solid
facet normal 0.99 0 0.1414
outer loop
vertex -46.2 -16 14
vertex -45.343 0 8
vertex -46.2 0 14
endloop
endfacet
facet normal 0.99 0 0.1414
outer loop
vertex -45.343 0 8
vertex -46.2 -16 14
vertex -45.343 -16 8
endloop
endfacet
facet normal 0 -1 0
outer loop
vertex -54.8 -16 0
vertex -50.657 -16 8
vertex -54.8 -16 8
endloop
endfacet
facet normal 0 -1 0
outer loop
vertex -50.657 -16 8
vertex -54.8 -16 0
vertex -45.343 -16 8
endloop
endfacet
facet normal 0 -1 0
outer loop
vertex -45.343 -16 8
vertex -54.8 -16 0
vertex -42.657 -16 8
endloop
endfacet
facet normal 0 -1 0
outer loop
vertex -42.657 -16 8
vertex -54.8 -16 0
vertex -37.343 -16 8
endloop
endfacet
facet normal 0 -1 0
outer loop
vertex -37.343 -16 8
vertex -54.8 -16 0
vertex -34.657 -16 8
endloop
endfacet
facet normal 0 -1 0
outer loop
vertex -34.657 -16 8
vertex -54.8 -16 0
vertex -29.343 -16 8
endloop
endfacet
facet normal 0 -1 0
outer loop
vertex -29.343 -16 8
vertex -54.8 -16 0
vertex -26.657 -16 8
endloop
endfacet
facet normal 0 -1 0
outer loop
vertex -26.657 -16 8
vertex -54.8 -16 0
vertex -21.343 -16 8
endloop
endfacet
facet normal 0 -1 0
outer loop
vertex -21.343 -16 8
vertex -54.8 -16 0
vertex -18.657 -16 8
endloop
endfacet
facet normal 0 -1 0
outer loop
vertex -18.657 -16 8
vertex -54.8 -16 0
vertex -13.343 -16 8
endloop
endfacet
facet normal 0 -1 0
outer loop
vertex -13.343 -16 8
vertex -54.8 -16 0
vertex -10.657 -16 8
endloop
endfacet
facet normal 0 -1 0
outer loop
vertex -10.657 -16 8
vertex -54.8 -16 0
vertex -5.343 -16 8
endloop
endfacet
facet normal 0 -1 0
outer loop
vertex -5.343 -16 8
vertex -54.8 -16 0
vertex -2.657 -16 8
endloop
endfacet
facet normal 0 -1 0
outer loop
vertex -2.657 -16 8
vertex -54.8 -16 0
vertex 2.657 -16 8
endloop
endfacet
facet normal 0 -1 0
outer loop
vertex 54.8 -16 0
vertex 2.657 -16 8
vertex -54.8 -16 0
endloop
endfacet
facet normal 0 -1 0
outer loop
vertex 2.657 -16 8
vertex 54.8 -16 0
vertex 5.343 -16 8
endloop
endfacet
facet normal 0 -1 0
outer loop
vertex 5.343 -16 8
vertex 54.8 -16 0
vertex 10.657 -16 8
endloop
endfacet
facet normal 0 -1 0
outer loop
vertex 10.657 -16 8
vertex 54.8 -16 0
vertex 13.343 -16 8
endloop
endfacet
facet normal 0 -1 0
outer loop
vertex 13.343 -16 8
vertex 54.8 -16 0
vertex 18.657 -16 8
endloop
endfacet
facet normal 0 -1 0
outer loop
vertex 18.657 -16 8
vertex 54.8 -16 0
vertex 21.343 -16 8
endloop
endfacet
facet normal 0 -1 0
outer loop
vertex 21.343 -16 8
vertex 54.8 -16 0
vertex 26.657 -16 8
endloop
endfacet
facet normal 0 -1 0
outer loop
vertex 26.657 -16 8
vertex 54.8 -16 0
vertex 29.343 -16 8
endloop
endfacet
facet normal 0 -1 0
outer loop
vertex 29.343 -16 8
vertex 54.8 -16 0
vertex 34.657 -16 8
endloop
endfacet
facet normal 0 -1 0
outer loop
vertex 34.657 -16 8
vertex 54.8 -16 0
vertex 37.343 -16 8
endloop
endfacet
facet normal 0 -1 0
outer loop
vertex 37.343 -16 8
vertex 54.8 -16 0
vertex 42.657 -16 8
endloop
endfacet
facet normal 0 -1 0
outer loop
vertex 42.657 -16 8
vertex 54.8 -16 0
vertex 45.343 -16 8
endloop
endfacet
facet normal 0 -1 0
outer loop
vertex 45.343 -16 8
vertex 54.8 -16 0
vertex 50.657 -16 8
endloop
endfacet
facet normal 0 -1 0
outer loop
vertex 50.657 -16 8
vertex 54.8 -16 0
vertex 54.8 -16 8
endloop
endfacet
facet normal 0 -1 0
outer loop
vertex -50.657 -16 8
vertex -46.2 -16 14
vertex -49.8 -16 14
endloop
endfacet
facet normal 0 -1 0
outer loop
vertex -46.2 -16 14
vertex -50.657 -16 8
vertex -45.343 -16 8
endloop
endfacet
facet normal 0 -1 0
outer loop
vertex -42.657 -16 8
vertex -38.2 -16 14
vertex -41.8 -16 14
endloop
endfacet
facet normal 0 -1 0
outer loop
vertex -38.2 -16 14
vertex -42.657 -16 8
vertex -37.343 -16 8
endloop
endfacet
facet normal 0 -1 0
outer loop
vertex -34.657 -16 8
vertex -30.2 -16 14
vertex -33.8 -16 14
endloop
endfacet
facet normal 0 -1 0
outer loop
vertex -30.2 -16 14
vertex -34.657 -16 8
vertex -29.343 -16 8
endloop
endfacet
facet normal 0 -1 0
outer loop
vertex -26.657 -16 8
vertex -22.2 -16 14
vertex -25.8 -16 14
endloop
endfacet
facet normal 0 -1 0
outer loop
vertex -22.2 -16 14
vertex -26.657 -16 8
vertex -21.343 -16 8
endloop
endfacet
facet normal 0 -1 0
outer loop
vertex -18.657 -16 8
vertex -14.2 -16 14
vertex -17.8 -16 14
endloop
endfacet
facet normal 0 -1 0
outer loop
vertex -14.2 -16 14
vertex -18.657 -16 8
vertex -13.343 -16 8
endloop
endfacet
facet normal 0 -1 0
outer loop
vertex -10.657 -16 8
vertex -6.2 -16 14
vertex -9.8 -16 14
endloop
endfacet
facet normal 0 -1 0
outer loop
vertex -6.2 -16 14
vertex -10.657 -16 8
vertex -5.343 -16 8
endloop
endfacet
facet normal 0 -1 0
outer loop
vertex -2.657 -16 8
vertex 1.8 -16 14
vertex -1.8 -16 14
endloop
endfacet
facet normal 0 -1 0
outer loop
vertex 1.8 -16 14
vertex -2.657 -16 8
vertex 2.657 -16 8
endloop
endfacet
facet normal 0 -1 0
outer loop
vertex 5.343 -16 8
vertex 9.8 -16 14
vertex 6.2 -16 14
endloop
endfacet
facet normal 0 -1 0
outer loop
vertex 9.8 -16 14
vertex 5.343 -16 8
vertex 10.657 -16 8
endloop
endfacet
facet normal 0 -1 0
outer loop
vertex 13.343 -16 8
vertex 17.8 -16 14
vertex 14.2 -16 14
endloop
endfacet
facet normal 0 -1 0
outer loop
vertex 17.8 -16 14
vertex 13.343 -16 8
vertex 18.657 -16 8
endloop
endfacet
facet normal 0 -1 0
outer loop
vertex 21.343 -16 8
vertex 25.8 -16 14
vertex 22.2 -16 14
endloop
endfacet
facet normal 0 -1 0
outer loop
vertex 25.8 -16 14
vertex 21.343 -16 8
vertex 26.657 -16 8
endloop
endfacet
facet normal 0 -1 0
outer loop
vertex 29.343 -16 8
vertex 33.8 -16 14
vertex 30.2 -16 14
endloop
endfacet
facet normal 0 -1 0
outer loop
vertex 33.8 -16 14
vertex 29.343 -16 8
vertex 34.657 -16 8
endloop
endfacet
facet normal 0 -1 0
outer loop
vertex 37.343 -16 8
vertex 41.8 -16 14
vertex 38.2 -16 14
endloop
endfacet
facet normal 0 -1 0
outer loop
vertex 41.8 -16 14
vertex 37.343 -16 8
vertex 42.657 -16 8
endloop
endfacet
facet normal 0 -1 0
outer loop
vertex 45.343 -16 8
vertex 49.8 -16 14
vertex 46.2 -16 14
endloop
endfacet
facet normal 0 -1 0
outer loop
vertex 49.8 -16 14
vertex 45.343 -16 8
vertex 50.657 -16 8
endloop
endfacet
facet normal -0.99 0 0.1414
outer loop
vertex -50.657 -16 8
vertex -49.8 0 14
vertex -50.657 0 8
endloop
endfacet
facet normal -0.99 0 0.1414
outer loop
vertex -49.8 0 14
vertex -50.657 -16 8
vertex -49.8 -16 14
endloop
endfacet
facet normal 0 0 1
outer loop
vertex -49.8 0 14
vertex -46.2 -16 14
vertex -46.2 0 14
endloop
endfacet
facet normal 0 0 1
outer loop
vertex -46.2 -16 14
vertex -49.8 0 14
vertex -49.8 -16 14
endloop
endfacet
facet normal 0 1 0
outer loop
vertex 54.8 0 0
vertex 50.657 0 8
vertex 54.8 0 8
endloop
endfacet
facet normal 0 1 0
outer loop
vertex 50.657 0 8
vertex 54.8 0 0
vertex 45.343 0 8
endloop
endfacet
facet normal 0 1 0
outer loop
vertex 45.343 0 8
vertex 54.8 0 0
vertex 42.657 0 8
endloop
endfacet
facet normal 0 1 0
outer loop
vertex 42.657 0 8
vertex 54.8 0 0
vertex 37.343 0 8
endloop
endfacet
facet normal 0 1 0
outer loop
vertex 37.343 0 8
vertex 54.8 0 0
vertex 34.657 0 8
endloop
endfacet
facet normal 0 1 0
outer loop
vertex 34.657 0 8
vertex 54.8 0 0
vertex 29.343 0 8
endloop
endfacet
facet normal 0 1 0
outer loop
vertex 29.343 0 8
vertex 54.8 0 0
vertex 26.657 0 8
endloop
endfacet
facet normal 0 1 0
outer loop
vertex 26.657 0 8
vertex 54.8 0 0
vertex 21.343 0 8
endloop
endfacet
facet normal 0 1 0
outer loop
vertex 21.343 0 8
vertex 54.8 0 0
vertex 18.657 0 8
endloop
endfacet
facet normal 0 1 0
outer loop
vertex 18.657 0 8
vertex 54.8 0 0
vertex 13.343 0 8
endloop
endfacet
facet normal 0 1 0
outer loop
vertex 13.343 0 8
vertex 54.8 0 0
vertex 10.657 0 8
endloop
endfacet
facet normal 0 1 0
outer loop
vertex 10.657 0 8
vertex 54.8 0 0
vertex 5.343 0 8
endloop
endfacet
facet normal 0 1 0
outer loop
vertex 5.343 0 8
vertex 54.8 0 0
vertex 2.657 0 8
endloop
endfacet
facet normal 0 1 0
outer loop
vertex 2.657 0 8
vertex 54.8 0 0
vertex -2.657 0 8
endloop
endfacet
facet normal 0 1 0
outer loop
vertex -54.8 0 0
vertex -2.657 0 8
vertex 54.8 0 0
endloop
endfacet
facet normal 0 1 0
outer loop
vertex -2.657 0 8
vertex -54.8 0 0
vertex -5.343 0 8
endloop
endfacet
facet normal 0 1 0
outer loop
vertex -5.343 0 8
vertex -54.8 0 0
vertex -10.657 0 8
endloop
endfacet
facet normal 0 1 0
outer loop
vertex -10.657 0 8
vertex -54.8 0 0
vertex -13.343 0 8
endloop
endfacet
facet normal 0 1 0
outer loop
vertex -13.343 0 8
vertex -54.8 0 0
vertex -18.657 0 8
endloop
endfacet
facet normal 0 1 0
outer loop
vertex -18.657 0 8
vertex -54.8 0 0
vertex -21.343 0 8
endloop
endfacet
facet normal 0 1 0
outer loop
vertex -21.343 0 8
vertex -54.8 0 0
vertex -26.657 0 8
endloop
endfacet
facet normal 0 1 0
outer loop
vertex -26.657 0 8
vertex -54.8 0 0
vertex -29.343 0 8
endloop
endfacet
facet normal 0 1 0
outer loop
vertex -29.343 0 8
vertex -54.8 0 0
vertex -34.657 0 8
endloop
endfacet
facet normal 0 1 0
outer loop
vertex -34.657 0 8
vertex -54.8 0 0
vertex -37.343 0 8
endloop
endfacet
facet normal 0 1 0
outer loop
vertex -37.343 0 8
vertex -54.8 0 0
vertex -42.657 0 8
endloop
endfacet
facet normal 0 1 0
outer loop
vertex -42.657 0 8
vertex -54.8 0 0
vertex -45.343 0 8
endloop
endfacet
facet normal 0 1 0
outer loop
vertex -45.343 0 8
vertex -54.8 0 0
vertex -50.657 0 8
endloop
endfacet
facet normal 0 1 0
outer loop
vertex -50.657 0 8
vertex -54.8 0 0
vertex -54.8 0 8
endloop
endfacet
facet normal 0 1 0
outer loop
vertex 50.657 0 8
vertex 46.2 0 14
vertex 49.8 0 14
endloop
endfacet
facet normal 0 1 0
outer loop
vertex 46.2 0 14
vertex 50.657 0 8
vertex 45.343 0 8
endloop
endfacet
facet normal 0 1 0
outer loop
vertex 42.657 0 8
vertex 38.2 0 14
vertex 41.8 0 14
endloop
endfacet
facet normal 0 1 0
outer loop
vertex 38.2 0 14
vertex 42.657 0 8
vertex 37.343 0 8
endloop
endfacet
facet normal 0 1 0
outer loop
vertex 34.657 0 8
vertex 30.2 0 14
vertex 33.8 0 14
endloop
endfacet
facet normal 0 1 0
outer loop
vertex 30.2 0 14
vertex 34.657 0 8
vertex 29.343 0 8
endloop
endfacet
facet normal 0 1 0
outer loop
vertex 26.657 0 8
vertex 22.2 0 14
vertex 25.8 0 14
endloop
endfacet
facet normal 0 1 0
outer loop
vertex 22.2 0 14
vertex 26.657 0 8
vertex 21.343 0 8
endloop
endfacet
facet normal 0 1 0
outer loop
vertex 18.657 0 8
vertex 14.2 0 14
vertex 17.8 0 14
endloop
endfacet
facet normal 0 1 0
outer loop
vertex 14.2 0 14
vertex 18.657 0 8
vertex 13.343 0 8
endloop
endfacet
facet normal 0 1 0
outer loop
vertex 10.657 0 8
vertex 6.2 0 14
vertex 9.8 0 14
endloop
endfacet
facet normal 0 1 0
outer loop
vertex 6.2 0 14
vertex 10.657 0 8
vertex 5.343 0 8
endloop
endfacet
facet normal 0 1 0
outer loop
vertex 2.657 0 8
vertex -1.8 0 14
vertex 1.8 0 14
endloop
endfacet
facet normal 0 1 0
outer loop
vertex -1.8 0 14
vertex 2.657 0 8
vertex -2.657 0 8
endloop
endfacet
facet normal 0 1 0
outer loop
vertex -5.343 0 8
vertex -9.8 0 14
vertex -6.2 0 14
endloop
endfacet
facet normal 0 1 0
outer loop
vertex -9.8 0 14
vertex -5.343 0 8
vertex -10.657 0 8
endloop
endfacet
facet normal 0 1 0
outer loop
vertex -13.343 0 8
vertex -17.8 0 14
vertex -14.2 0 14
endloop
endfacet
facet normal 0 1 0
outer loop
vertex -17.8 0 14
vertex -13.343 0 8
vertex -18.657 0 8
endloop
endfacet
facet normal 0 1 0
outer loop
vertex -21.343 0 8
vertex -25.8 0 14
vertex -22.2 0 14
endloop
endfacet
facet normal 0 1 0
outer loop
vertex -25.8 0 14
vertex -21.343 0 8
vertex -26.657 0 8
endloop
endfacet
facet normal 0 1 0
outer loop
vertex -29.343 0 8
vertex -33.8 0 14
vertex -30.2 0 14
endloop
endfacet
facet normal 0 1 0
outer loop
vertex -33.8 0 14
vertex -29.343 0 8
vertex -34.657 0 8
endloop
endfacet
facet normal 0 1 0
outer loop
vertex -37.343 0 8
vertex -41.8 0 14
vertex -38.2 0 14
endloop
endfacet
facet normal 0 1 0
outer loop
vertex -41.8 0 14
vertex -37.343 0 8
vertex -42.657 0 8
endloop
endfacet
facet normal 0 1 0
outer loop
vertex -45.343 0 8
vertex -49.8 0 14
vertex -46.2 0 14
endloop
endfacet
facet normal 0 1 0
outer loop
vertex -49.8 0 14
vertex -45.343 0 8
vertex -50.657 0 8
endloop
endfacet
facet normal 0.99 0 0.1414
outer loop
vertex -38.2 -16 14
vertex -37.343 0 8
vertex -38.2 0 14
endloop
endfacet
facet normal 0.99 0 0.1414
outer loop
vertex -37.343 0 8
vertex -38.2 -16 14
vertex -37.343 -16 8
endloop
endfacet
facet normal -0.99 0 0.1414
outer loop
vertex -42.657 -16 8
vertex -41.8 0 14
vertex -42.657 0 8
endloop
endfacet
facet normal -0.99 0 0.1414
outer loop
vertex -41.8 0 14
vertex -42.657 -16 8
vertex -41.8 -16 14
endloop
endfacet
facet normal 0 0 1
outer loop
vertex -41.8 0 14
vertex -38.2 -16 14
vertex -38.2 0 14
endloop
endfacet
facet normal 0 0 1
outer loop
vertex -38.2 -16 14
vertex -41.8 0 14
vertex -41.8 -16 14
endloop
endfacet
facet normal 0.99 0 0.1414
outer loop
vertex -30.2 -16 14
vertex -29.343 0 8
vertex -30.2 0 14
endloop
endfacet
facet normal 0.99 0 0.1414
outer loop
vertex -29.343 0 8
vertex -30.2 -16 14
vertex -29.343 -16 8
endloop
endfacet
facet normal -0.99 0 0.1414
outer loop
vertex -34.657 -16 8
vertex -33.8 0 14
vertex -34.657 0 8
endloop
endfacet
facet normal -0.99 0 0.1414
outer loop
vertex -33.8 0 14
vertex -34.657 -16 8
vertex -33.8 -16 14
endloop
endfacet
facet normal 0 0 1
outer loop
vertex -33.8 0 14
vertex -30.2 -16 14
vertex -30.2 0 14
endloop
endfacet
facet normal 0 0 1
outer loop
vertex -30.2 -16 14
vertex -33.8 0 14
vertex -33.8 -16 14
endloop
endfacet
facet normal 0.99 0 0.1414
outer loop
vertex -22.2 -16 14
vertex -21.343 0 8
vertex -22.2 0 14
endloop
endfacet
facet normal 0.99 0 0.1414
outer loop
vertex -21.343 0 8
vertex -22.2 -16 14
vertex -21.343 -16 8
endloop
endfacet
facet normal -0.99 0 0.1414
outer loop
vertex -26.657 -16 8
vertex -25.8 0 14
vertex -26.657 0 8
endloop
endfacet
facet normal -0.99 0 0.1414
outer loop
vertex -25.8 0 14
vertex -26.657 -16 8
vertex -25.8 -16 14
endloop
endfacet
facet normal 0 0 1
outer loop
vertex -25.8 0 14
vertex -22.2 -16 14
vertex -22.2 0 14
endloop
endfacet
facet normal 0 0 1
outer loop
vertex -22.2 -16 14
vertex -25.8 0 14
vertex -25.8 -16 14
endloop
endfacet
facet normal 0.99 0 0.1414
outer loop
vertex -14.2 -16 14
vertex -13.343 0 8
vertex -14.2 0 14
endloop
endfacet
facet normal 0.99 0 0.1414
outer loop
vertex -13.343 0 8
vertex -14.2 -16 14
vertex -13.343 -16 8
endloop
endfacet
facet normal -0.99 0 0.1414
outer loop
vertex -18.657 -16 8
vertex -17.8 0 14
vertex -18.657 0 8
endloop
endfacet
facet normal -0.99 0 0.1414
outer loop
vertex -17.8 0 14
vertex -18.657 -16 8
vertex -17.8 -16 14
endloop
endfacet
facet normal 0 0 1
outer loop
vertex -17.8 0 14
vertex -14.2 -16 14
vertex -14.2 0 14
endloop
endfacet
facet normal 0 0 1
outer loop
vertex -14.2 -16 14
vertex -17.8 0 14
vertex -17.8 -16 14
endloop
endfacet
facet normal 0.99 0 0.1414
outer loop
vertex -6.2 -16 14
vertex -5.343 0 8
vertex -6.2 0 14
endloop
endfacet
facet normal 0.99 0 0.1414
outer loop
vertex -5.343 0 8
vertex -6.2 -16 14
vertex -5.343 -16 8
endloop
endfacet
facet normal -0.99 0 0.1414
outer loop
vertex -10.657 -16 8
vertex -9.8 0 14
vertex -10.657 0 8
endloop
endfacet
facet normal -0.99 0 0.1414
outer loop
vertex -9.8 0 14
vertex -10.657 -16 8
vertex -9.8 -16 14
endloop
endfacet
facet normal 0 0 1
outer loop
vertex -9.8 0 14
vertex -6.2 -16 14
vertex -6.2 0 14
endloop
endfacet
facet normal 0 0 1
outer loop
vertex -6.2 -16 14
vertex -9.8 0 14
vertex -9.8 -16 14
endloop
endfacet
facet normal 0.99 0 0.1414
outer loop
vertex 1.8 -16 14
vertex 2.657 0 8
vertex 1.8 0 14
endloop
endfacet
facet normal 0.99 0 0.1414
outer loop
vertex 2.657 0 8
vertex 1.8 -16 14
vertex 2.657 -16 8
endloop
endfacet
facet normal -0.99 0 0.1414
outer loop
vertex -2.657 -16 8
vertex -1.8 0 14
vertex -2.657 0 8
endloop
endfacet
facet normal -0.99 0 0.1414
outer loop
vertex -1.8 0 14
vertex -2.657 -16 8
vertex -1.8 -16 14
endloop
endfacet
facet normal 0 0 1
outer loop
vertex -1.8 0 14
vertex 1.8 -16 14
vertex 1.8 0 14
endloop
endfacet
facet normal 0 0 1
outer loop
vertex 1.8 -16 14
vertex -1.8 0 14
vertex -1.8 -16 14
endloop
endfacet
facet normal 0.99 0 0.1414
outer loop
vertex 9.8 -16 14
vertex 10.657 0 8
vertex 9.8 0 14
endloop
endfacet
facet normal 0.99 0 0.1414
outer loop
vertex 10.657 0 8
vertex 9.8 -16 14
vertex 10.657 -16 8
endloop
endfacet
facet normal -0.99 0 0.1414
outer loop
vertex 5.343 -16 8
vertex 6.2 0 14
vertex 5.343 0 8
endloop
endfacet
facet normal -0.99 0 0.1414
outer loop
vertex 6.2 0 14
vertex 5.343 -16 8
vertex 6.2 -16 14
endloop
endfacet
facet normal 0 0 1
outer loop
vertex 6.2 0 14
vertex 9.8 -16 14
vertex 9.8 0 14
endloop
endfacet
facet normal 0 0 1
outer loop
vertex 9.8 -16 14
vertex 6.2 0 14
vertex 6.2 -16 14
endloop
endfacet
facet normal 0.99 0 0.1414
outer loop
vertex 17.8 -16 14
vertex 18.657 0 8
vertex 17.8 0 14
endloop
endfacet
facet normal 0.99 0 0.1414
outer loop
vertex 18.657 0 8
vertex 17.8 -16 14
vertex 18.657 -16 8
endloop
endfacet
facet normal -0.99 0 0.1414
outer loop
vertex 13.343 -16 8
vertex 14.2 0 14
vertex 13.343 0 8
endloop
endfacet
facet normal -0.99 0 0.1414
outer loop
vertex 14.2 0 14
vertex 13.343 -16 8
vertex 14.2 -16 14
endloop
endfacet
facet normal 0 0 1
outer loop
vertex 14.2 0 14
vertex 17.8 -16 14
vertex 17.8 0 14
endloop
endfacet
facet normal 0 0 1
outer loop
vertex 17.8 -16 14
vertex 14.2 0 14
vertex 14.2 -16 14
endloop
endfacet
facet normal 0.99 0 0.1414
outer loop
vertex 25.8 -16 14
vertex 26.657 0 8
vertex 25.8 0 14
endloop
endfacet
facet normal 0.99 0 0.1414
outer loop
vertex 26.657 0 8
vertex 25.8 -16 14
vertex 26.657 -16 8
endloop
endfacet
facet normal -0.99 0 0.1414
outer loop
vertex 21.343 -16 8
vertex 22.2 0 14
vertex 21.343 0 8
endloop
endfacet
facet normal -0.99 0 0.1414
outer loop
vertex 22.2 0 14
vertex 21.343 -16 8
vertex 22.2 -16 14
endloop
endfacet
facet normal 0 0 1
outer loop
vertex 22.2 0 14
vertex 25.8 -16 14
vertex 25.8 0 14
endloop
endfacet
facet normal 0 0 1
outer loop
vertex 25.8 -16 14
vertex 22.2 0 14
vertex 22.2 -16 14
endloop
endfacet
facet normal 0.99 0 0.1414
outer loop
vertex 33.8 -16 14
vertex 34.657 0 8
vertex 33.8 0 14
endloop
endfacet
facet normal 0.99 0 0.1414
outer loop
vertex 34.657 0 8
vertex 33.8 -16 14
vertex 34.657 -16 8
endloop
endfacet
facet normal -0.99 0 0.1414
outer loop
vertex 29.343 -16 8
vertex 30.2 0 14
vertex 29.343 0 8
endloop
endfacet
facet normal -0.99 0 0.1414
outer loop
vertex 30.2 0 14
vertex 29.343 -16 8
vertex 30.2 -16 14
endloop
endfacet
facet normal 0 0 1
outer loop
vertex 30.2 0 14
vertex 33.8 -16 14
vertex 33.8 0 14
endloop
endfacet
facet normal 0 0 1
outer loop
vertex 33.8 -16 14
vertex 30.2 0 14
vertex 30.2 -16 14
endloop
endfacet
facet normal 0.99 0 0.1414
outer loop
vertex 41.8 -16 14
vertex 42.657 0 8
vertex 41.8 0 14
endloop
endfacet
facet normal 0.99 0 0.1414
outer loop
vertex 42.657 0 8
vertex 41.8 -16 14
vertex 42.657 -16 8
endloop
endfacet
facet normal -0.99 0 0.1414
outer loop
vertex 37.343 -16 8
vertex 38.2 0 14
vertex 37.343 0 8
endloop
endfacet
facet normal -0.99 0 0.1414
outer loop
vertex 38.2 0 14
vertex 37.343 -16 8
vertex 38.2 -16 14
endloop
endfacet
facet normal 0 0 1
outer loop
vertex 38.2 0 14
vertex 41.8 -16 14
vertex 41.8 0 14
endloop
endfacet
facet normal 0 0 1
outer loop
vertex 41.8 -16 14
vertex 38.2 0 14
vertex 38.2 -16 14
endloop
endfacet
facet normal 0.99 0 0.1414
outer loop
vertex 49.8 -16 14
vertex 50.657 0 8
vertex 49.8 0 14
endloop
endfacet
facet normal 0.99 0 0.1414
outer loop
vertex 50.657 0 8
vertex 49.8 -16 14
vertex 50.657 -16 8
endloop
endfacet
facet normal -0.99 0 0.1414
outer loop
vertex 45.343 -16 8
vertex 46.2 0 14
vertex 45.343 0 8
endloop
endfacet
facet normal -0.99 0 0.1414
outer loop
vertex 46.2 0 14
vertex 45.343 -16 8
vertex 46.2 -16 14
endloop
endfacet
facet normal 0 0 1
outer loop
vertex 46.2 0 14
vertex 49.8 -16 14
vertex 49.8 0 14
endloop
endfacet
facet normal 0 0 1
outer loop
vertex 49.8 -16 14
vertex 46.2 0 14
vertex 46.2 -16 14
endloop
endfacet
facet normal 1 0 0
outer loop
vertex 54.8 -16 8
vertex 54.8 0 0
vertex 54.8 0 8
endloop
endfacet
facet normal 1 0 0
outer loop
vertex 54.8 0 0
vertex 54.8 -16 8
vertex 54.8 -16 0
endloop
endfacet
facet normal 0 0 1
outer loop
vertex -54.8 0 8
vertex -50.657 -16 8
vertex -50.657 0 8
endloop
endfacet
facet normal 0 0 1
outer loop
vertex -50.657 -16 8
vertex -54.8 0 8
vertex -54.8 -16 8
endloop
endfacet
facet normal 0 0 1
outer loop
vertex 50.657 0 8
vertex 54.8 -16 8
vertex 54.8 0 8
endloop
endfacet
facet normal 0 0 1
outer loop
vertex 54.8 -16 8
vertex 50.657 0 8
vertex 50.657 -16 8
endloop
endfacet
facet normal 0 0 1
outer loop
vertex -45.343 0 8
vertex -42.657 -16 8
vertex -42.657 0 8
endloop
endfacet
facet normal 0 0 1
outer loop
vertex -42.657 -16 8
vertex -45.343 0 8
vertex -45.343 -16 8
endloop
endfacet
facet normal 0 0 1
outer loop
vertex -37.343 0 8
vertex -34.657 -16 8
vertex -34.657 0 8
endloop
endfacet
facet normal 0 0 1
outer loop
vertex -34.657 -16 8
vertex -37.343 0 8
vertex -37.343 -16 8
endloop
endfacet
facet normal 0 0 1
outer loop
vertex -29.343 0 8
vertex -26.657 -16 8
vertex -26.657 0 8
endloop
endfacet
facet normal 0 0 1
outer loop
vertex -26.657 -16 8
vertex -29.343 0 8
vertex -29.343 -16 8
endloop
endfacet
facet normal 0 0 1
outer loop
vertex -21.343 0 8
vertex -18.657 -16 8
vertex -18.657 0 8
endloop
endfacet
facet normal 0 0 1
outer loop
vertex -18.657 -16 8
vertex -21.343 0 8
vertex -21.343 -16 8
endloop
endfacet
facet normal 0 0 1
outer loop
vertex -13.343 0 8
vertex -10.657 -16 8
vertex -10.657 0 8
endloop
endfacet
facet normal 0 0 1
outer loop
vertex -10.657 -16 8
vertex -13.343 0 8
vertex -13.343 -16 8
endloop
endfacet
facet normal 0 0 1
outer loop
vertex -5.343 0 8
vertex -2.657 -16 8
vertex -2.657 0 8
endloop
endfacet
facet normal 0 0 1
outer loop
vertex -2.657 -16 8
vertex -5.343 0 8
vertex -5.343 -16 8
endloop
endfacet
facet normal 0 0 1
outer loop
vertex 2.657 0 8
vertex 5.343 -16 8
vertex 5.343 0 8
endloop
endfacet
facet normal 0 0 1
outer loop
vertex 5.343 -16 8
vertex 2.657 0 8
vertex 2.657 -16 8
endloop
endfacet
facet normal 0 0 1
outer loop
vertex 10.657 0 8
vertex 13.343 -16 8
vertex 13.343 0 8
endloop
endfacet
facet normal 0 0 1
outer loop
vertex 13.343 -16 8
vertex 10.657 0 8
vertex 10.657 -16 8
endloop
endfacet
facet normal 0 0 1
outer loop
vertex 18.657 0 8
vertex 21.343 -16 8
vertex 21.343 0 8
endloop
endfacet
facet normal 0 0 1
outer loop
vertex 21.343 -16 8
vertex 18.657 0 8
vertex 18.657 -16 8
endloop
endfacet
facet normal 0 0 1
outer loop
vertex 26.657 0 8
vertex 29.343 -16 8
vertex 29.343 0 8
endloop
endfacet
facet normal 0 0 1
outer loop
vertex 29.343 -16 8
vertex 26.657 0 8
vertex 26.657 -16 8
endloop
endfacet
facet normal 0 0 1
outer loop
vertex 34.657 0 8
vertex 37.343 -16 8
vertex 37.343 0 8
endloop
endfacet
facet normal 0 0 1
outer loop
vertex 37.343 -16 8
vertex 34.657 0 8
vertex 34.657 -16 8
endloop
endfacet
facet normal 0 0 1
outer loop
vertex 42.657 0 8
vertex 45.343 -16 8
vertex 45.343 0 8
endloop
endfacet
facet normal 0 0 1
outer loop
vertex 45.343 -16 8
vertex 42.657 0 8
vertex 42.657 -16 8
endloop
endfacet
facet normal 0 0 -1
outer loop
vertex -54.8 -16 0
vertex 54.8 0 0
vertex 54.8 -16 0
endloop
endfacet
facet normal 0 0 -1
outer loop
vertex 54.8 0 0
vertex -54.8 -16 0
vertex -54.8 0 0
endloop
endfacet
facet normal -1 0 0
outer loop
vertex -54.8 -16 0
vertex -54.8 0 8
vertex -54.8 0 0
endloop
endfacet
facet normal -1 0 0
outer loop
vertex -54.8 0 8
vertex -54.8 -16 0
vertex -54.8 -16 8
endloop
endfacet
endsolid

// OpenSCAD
$fn = 32;

// ----------------------------------------------------------------------
// Toothed rack, 13 teeth
// 8 mm pitch, 6 mm teeth
// ----------------------------------------------------------------------

// --- parameters (mm) ---
bar_w = 16;     // bar width (Y)
bar_h = 8;      // bar height (Z)
teeth = 13;     // number of teeth
pitch = 8;      // tooth pitch
tooth_h = 6;    // tooth height above the bar
root_w = 5.6;   // tooth width at the root
crest_w = 3.6;  // tooth width at the crest

// --- derived feature positions (mm) ---
span = (teeth - 1) * pitch;  // = 96   distance between the outer teeth
bar_l = span + root_w + 8;   // = 109.6   bar length: teeth plus 4 mm at each end
tooth_x = -span / 2;         // = -48   X of the first tooth
height = bar_h + tooth_h;    // = 14   overall height
feature_centers = [
  [tooth_x + 0 * pitch, -bar_w / 2],
  [tooth_x + 1 * pitch, -bar_w / 2],
  [tooth_x + 2 * pitch, -bar_w / 2],
  [tooth_x + 3 * pitch, -bar_w / 2],
  [tooth_x + 4 * pitch, -bar_w / 2],
  [tooth_x + 5 * pitch, -bar_w / 2],
  [tooth_x + 6 * pitch, -bar_w / 2],
  [tooth_x + 7 * pitch, -bar_w / 2],
  [tooth_x + 8 * pitch, -bar_w / 2],
  [tooth_x + 9 * pitch, -bar_w / 2],
  [tooth_x + 10 * pitch, -bar_w / 2],
  [tooth_x + 11 * pitch, -bar_w / 2],
  [tooth_x + 12 * pitch, -bar_w / 2]
];   // tooth centre line, drives the tooth loop

// bar with a rack of teeth, one extruded trapezoium per centre
module rack_tooth() {
  linear_extrude(height = bar_w)
    polygon(points = [
      [0, 0],
      [root_w, 0],
      [root_w / 2 + crest_w / 2, tooth_h + 1],
      [root_w / 2 - crest_w / 2, tooth_h + 1]
    ]);
}

union() {
  translate([-bar_l / 2, -bar_w, 0]) cube([bar_l, bar_w, bar_h]);
  for (centre = feature_centers)
    translate([centre[0] - root_w / 2, 0, bar_h - 1]) rotate([90, 0, 0]) rack_tooth();
}
